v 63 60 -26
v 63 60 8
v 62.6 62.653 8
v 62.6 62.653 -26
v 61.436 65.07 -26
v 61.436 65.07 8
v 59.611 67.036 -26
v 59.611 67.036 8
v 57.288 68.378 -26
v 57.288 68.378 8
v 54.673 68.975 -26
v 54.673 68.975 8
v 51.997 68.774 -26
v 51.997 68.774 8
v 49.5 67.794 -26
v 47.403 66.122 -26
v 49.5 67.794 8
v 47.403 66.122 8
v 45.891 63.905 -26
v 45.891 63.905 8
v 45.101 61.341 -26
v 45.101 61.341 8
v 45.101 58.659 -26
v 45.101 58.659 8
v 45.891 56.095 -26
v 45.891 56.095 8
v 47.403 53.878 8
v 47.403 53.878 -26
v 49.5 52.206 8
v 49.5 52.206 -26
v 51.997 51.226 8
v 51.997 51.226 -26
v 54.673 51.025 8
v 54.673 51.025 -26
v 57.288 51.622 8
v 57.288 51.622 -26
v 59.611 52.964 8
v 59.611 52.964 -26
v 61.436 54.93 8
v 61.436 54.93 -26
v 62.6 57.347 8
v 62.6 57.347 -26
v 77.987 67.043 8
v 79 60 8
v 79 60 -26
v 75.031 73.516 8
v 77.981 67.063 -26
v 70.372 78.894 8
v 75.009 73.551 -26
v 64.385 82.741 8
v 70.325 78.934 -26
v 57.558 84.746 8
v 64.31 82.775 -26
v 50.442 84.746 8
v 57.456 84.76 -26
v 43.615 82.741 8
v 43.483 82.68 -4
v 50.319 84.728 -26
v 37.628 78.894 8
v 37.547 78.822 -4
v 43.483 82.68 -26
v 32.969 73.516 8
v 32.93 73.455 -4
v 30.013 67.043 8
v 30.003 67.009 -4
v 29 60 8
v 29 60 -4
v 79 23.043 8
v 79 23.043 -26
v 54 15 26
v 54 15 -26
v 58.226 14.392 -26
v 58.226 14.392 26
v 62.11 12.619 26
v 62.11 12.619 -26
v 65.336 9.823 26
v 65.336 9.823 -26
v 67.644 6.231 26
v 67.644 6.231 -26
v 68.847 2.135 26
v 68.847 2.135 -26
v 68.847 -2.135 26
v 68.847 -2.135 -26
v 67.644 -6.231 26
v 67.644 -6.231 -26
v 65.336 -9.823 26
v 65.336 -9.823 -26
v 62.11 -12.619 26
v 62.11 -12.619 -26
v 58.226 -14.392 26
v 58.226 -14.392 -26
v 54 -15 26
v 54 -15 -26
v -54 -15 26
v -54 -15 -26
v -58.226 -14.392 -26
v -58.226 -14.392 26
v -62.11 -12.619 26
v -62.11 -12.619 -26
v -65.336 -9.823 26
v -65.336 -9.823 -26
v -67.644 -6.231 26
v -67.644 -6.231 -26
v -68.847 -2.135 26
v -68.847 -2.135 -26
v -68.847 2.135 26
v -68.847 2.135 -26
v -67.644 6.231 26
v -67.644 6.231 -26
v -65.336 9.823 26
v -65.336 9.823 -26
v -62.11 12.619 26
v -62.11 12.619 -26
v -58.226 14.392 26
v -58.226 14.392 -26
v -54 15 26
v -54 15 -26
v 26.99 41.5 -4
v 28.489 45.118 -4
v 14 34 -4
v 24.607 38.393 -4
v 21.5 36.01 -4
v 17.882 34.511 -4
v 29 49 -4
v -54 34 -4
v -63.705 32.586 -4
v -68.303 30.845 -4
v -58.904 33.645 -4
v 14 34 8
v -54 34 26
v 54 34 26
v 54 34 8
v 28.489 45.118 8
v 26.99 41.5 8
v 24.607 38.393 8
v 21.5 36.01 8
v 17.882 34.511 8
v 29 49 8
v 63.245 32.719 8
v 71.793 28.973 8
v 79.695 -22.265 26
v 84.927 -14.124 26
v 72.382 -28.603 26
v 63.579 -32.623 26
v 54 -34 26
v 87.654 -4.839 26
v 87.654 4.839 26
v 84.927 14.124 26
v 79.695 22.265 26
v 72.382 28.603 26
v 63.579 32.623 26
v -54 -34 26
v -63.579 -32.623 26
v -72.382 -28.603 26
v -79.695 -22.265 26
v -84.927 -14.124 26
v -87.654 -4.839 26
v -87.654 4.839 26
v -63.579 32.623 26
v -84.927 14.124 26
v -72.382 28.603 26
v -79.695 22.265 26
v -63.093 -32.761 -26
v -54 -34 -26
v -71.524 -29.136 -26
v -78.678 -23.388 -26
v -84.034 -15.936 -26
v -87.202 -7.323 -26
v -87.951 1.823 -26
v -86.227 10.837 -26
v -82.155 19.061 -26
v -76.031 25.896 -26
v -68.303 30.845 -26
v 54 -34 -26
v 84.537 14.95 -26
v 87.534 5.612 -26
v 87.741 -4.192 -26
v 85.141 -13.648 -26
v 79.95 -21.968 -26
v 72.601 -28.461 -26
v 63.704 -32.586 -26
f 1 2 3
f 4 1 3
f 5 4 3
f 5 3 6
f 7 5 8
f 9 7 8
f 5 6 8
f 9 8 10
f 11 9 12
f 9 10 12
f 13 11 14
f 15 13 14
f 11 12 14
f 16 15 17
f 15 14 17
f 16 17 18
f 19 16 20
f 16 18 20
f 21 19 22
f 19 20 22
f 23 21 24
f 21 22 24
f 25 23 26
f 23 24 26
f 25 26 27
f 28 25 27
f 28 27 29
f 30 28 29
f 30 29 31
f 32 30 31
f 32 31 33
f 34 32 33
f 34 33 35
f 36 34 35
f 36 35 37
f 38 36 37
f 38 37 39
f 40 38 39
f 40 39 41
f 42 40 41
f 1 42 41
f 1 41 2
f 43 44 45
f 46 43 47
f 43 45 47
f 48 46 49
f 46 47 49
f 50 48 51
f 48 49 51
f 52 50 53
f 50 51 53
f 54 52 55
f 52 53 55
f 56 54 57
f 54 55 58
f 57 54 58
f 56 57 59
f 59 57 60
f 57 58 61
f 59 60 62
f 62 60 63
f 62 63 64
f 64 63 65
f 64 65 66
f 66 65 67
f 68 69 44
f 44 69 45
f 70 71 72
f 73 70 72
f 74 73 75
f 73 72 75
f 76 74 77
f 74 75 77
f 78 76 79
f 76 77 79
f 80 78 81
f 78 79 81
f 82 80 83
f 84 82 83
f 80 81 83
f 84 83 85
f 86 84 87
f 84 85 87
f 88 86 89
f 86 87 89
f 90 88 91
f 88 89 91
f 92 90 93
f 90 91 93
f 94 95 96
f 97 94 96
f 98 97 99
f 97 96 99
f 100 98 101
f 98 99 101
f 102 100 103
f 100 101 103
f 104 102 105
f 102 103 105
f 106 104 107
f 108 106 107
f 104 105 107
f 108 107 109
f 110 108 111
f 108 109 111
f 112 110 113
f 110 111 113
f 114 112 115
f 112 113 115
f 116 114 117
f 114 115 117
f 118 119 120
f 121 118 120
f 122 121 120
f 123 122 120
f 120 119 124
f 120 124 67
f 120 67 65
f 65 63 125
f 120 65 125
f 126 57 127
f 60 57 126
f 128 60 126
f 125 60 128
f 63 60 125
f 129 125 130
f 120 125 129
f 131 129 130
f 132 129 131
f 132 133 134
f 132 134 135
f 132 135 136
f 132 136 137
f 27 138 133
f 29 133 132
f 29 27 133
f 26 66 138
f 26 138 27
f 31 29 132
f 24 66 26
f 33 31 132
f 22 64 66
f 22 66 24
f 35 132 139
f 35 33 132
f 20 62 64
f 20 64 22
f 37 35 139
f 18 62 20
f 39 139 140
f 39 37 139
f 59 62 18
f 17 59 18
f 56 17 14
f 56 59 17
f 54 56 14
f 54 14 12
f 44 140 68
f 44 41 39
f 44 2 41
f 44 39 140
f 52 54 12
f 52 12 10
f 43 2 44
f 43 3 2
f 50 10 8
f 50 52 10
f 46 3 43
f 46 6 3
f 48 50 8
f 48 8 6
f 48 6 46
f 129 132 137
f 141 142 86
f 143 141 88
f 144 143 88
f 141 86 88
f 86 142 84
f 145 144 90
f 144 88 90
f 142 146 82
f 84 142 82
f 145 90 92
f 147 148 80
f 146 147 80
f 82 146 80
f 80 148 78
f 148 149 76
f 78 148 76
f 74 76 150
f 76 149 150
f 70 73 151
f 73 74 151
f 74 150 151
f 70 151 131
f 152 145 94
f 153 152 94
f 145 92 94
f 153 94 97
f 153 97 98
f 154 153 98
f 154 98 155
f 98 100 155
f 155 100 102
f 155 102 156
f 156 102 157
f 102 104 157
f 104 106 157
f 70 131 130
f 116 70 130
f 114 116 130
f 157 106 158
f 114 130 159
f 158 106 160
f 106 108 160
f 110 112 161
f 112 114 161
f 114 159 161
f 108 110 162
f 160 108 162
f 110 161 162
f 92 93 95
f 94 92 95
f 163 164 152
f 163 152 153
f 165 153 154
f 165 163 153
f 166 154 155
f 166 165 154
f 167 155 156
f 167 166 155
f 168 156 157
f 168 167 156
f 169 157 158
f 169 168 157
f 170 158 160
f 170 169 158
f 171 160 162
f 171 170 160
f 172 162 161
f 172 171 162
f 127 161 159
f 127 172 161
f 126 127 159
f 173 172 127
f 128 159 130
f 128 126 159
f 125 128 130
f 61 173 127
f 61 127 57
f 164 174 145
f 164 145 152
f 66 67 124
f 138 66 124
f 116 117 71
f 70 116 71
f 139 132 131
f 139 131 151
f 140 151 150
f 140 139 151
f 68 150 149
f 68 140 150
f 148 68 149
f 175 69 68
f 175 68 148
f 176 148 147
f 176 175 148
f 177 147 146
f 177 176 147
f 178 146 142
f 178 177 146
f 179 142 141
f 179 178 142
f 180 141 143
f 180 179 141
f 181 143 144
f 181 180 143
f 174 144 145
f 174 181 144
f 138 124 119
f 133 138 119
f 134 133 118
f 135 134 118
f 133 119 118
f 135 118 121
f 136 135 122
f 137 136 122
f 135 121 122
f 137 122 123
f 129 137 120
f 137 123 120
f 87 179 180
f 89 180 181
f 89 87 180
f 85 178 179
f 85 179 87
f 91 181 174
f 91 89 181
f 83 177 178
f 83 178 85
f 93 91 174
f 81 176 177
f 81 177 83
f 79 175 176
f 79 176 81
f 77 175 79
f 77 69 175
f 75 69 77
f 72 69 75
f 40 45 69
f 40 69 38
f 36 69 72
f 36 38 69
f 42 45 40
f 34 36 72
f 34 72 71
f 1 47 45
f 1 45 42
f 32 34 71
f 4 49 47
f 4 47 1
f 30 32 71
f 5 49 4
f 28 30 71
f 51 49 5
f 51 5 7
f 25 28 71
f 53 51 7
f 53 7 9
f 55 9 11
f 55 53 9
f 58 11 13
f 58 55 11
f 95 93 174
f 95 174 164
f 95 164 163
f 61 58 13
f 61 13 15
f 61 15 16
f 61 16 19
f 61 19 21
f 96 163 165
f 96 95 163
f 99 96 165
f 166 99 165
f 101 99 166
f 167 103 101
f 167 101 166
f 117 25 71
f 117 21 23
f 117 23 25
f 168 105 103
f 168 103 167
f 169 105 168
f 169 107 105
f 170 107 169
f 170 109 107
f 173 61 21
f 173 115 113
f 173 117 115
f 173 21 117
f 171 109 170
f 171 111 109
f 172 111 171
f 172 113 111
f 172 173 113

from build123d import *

# Parameters (mm, degrees)
BOSS_EXTRUDE1_DEPTH      = 26
BOSS_EXTRUDE1_DEPTH_BACK = 26
BOSS_EXTRUDE2_DEPTH      = 34
HOLE1_D                  = 18
BOSS_EXTRUDE3_DEPTH      = 22


with BuildPart() as part:
    # Sketch1 → Boss-Extrude1 (new, two sides: drawn at the far end of the back side and taken through both)
    with BuildSketch(Plane.XY.offset(-BOSS_EXTRUDE1_DEPTH_BACK)):
        with BuildLine():
            Line((-54, 34), (54, 34))
            ThreePointArc((54, 34), (88, 0), (54, -34))
            Line((54, -34), (-54, -34))
            ThreePointArc((-54, -34), (-88, 0), (-54, 34))
        make_face()
        with BuildLine():
            Line((-54, 15), (54, 15))
            ThreePointArc((54, 15), (69, 0), (54, -15))
            Line((54, -15), (-54, -15))
            ThreePointArc((-54, -15), (-69, 0), (-54, 15))
        make_face(mode=Mode.SUBTRACT)
    extrude(amount=BOSS_EXTRUDE1_DEPTH + BOSS_EXTRUDE1_DEPTH_BACK)

    # Sketch2 → Boss-Extrude2 (add)
    with BuildSketch(Plane(origin=(0, 0, -26), x_dir=(-1, 0, 0), z_dir=(0, 0, -1))):
        with BuildLine():
            Line((-29, 60), (-29, 49))
            ThreePointArc((-29, 49), (-24.606601718, 38.393398282), (-14, 34))
            Line((-14, 34), (-54, 34))
            ThreePointArc((-54, 34), (-67.647767834, 31.140623519), (-79, 23.043437244))
            Line((-79, 23.043437244), (-79, 60))
            ThreePointArc((-79, 60), (-54, 85), (-29, 60))
        make_face()
    extrude(amount=-BOSS_EXTRUDE2_DEPTH)

    # Hole1 (through all)
    with Locations(Plane(origin=(0, 0, -26), x_dir=(-1, 0, 0), z_dir=(0, 0, -1))):
        with Locations((-54, 60)):
            Hole(HOLE1_D / 2)

    # Sketch5 → Boss-Extrude3 (add)
    with BuildSketch(Plane(origin=(0, 0, -26), x_dir=(-1, 0, 0), z_dir=(0, 0, -1))):
        with BuildLine():
            Line((-14, 34), (54, 34))
            ThreePointArc((54, 34), (61.323344829, 33.201937), (68.302896095, 30.845212972))
            Line((68.302896095, 30.845212972), (-43.483164636, 82.680303656))
            ThreePointArc((-43.483164636, 82.680303656), (-32.929631184, 73.455094126), (-29, 60))
            Line((-29, 60), (-29, 49))
            ThreePointArc((-29, 49), (-24.606601718, 38.393398282), (-14, 34))
        make_face()
    extrude(amount=-BOSS_EXTRUDE3_DEPTH)


solid = part.part
